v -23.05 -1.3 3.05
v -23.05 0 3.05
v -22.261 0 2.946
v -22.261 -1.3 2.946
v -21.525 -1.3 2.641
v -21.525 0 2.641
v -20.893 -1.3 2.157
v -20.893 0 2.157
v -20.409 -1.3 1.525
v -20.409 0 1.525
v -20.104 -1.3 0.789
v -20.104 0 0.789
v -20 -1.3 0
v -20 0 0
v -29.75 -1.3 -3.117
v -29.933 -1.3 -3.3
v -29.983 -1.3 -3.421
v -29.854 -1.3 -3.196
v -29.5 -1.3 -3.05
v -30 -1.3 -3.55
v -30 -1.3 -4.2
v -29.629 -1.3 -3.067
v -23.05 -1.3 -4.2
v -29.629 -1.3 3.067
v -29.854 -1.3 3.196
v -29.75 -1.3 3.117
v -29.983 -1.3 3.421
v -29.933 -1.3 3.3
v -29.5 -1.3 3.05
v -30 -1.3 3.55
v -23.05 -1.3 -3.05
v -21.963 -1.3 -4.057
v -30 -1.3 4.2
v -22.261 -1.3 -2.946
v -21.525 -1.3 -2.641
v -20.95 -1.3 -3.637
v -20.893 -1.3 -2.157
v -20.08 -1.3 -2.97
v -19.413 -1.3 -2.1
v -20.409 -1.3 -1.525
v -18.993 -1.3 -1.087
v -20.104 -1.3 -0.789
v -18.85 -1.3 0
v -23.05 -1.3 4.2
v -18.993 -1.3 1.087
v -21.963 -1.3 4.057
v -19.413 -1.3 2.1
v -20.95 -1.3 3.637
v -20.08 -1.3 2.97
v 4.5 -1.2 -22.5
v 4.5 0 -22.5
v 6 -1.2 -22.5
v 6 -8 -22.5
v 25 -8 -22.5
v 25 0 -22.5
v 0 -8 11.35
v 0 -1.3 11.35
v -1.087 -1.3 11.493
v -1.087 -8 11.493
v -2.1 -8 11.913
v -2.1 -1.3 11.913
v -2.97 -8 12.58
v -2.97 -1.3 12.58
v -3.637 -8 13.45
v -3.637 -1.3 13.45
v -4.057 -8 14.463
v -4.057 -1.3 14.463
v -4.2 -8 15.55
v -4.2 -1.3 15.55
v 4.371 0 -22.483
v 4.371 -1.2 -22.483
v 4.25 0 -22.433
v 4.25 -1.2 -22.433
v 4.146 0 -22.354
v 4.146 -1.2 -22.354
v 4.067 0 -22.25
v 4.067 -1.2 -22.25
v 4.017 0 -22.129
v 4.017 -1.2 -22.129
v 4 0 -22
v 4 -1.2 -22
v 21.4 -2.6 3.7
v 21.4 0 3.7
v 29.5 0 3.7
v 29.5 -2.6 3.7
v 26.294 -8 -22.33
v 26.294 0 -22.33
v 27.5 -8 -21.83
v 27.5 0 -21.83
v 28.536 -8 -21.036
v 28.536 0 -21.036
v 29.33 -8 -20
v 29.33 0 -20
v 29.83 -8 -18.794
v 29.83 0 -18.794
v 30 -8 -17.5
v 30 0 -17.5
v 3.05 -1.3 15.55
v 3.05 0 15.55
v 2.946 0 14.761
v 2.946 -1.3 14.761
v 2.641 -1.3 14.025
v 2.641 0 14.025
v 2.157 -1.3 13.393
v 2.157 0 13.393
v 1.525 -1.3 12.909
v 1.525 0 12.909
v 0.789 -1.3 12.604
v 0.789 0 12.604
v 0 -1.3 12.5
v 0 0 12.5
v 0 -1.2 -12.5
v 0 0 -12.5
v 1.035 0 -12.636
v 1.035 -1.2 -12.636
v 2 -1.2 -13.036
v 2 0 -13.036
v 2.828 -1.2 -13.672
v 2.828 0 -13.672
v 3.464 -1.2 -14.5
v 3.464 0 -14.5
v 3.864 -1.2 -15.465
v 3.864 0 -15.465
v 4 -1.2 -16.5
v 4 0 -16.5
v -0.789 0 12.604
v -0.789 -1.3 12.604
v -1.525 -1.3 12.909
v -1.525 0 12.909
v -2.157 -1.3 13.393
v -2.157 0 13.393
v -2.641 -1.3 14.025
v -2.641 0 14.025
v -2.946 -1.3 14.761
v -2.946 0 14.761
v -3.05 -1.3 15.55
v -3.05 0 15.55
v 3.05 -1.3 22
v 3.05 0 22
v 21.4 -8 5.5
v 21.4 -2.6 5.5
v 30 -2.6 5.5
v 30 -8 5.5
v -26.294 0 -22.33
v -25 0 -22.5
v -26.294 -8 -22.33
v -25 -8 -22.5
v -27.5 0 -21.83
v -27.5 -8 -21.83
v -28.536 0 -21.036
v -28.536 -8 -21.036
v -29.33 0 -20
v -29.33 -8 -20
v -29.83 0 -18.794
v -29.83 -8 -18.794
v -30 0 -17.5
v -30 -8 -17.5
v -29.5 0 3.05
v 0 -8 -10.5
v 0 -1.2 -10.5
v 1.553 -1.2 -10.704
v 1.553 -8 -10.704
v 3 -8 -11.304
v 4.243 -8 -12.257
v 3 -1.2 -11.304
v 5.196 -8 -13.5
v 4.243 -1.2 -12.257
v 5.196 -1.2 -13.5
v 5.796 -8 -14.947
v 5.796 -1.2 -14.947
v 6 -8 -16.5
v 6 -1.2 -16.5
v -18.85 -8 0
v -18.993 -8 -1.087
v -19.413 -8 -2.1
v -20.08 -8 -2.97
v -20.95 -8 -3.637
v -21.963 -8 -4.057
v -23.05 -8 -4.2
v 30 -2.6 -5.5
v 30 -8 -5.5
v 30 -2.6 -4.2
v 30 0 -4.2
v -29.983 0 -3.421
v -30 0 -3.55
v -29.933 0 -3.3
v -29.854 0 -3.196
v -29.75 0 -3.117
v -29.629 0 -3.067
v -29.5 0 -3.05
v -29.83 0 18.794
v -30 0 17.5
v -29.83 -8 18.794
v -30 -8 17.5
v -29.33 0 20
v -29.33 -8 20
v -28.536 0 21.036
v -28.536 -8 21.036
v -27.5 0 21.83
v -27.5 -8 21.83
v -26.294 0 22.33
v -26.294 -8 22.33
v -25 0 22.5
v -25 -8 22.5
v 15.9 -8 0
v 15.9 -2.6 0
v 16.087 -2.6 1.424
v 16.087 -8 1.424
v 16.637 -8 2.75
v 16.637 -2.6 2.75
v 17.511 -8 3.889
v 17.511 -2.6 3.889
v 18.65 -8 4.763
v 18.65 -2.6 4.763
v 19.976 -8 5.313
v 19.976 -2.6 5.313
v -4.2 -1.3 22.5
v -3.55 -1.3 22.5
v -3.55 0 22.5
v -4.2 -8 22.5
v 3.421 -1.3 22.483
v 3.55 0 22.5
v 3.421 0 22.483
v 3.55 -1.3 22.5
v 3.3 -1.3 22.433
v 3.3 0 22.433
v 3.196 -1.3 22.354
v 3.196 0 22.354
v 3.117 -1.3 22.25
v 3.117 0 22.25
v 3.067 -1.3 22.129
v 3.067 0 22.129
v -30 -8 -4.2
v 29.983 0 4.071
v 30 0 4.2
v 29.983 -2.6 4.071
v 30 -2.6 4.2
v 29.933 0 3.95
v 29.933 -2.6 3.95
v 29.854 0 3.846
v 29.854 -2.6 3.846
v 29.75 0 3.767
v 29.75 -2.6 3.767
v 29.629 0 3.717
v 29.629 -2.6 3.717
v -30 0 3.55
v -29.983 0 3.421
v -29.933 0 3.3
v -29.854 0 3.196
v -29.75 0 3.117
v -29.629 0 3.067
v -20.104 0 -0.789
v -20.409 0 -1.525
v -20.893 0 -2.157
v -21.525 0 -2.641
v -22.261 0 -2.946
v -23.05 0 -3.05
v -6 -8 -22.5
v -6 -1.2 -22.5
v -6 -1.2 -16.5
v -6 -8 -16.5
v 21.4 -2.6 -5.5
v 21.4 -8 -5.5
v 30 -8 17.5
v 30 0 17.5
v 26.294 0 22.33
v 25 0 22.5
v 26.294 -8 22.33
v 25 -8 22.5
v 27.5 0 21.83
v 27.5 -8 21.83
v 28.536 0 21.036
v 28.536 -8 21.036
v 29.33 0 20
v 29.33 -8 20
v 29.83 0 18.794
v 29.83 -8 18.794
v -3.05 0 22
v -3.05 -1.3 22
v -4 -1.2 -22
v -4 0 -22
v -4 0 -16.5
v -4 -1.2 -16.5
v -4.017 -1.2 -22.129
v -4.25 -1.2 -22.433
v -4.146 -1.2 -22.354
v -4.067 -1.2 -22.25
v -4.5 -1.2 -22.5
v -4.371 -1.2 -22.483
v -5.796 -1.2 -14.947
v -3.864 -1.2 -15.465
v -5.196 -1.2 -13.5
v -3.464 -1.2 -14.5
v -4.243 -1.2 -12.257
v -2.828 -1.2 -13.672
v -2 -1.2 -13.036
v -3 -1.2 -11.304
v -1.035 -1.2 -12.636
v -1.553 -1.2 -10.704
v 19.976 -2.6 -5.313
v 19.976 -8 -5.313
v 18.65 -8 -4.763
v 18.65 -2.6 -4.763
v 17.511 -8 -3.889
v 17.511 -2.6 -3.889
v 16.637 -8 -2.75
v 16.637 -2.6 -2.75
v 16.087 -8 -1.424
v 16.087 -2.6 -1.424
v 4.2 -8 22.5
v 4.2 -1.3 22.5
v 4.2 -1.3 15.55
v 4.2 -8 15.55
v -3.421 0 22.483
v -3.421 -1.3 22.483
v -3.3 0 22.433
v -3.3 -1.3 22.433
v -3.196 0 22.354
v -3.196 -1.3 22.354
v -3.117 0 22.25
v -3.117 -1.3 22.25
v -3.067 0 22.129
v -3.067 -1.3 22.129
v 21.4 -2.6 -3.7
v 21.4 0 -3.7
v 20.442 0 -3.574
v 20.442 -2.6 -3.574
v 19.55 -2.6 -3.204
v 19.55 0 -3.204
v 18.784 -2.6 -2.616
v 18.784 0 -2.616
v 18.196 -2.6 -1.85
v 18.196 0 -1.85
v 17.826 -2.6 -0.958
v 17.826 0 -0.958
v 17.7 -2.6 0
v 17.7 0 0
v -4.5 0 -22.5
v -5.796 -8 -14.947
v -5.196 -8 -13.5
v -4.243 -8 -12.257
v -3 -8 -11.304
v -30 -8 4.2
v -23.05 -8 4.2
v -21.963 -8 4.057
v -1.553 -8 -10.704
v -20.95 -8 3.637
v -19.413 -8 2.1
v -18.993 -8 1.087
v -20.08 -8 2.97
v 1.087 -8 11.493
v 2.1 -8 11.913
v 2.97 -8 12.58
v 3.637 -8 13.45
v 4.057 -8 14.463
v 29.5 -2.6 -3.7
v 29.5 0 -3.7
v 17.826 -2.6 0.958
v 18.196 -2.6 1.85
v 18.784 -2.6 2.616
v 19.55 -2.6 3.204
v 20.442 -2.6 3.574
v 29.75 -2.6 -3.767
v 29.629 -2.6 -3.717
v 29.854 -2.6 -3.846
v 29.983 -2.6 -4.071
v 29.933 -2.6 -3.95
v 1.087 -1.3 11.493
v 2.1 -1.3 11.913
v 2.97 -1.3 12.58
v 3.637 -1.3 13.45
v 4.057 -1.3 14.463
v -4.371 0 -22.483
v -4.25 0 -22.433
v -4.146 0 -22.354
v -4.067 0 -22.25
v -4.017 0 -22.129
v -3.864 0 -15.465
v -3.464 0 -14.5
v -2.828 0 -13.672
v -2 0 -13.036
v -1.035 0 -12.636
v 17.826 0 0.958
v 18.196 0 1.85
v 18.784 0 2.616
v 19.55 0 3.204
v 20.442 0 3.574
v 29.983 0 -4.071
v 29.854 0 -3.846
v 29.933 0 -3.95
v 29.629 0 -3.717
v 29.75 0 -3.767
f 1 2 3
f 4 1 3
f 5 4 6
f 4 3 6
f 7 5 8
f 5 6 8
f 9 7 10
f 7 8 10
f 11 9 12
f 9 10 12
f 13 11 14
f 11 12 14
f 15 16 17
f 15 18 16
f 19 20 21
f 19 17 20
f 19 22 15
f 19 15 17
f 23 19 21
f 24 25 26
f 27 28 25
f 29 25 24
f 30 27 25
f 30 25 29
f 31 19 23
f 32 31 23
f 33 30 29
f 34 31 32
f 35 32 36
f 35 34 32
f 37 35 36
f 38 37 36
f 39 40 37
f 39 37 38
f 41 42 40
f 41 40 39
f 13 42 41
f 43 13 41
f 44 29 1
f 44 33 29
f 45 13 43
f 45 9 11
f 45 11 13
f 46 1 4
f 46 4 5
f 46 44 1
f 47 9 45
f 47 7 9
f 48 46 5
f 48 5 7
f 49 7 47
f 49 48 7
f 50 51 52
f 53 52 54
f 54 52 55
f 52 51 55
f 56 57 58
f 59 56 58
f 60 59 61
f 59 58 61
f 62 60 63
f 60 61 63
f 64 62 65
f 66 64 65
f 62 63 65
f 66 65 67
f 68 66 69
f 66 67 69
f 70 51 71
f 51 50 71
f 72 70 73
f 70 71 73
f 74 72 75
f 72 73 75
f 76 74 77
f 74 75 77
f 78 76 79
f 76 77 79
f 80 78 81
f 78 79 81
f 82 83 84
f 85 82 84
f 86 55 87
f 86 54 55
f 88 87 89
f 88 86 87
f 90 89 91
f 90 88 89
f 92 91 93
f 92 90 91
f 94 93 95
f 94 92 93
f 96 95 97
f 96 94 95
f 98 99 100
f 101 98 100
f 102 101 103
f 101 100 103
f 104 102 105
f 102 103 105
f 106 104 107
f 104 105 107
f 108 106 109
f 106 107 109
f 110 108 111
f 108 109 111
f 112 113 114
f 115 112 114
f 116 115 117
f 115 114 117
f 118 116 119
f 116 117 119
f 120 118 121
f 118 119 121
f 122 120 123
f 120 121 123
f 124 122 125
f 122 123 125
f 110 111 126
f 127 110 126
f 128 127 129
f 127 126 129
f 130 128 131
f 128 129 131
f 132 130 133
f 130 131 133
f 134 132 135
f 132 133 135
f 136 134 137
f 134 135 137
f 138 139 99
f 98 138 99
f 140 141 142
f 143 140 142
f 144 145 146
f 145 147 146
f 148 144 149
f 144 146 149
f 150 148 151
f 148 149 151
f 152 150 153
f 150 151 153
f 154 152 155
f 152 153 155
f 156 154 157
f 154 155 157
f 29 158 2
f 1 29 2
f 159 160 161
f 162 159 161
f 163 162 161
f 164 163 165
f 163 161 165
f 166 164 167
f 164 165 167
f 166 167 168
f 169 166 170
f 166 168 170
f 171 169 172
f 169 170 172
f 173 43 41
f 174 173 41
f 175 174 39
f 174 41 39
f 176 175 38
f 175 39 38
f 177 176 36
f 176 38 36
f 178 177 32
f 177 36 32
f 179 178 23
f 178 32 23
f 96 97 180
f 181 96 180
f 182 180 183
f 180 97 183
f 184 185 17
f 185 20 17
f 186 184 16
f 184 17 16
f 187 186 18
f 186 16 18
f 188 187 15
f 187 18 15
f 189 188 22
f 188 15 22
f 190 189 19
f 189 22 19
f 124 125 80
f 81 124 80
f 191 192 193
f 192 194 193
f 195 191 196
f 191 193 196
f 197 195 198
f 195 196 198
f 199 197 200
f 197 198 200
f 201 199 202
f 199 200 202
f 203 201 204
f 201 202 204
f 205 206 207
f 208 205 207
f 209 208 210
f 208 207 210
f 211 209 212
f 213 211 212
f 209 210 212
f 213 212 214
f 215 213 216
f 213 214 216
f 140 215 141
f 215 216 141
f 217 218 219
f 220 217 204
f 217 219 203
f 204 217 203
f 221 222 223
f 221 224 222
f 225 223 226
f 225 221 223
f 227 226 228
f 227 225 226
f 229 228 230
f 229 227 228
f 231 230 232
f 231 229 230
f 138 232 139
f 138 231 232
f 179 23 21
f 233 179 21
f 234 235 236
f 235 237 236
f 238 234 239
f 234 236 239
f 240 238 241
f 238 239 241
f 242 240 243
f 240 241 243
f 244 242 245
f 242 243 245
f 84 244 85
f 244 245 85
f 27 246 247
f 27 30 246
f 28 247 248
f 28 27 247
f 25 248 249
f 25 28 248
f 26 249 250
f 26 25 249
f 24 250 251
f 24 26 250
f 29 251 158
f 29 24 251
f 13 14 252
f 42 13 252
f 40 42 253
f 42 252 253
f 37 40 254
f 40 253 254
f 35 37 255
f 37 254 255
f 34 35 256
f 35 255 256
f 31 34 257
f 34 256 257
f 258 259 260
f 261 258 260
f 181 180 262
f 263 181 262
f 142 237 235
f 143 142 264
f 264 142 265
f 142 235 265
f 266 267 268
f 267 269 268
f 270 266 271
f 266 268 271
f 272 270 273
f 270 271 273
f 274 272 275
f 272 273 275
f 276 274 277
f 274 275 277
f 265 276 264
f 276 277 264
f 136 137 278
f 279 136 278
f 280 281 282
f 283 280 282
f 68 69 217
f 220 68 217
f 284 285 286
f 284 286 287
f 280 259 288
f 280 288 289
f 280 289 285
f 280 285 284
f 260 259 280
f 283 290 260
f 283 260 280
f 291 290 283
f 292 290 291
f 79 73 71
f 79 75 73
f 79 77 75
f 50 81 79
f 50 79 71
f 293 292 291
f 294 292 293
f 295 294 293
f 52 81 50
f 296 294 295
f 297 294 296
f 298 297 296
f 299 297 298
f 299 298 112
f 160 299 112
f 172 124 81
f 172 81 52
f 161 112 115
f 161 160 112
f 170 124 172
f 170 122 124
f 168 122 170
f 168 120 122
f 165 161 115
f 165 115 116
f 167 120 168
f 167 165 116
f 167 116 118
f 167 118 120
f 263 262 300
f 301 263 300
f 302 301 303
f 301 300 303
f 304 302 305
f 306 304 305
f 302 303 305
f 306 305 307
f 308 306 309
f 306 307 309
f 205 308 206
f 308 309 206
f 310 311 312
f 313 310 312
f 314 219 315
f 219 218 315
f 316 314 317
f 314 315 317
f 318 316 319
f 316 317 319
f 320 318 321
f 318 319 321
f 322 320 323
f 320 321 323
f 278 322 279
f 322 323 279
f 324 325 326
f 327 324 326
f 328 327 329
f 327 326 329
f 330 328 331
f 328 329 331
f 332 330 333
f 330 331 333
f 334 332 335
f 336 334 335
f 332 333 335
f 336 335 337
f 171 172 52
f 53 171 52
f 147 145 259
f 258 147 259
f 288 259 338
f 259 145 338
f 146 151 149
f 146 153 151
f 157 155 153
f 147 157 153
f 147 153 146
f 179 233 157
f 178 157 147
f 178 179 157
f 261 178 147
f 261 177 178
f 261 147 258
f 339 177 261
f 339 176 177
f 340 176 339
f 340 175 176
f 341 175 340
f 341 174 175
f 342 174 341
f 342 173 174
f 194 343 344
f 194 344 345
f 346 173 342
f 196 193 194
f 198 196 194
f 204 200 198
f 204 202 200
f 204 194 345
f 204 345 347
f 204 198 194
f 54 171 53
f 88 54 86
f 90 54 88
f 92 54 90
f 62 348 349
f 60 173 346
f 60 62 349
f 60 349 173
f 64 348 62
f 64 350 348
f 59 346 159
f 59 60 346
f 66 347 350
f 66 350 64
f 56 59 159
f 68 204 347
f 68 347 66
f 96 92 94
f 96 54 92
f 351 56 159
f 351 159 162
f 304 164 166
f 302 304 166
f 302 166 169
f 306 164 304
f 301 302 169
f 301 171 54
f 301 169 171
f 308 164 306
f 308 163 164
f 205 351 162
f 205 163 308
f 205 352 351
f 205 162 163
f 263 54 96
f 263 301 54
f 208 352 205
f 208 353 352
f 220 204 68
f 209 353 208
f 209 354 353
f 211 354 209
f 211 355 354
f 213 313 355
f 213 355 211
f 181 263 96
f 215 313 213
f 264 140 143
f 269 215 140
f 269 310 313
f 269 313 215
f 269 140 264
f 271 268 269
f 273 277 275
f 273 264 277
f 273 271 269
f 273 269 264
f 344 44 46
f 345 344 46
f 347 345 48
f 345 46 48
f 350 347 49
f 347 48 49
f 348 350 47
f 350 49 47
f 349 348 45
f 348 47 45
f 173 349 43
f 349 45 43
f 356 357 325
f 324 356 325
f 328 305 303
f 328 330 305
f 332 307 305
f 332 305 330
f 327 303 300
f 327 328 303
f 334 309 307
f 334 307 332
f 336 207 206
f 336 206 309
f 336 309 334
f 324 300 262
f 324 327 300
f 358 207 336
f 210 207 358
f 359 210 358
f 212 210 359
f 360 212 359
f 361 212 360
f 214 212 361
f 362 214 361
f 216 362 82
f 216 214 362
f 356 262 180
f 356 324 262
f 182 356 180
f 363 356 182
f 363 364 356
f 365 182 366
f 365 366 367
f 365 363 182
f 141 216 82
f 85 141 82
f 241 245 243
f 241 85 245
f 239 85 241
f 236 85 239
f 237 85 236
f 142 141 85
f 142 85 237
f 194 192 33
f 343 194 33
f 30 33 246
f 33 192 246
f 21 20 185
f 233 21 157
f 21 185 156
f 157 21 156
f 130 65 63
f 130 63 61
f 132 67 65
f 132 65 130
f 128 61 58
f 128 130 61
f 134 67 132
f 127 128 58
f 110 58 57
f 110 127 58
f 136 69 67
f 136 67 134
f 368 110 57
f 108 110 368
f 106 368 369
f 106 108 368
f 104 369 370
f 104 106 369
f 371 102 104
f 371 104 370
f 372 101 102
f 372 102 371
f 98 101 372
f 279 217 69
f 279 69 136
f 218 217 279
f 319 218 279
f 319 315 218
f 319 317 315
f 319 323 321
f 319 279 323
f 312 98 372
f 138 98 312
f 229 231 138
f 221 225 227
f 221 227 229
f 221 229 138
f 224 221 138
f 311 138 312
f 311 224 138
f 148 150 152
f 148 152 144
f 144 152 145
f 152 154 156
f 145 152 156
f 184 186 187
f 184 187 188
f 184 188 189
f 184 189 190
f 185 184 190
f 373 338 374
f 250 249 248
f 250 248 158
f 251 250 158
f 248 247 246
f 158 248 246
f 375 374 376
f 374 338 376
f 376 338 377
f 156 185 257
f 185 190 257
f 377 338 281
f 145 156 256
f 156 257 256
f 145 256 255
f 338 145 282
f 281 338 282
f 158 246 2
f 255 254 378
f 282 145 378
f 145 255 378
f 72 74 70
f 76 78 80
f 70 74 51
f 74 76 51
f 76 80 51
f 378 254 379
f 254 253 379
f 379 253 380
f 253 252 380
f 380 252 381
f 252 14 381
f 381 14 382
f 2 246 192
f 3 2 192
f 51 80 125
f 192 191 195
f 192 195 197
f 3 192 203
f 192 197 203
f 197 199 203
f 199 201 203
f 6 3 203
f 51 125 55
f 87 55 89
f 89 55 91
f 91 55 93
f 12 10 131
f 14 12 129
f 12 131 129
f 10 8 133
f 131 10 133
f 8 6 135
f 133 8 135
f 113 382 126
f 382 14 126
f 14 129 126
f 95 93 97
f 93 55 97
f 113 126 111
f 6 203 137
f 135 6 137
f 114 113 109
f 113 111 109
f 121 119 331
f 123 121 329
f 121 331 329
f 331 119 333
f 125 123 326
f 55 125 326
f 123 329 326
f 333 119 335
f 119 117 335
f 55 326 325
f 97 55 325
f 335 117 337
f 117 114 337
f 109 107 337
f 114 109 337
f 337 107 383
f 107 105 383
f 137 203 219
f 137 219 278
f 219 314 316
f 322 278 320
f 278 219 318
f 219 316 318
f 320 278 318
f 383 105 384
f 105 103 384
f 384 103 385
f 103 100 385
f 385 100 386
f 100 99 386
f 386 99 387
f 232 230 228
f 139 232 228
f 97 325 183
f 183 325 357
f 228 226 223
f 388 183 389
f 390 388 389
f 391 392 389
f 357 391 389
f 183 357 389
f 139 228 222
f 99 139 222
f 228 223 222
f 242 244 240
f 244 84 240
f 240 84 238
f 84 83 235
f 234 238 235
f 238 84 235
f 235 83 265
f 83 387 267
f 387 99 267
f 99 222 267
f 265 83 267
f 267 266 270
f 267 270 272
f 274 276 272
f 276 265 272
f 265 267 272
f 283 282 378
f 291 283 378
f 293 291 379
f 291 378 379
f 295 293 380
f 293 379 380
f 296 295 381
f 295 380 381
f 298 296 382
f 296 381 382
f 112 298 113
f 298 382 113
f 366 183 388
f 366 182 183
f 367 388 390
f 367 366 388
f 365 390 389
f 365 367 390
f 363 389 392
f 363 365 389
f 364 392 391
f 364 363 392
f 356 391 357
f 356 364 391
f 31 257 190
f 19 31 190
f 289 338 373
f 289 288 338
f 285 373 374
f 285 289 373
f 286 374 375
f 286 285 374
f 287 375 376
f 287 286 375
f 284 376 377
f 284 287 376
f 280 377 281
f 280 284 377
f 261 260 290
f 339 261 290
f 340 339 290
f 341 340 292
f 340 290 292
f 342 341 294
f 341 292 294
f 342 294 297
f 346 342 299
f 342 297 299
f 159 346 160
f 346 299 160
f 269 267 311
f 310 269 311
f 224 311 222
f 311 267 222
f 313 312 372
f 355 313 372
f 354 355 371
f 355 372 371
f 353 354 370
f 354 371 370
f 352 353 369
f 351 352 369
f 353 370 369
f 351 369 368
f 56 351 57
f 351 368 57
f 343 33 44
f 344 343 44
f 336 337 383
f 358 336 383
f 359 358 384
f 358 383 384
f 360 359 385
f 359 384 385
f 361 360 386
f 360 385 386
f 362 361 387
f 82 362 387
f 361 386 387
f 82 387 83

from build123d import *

# Parameters (mm, degrees)
F1_DEPTH = 8
F2_DEPTH = 1.3
F3_DEPTH = 2.6
F4_DEPTH = 1.3
F5_DEPTH = 1.2
F6_R     = 5
F7_R     = 0.5


with BuildPart() as f1:
    # F0 (on Front) → F1 (new body)
    with BuildSketch(Plane.XZ):
        with BuildLine():
            Line((6, -22.5), (30, -22.5))
            Line((30, -22.5), (30, -5.5))
            Line((30, -5.5), (21.4, -5.5))
            ThreePointArc((21.4, -5.5), (17.5109127035, -3.8890872965), (15.9, 0))
            ThreePointArc((15.9, 0), (17.5109127035, 3.8890872965), (21.4, 5.5))
            Line((21.4, 5.5), (30, 5.5))
            Line((30, 5.5), (30, 22.5))
            Line((30, 22.5), (4.2, 22.5))
            Line((4.2, 22.5), (4.2, 15.5500004172))
            ThreePointArc((4.2, 15.5500004172), (2.969848481, 12.5801519362), (0, 11.3500004172))
            ThreePointArc((0, 11.3500004172), (-2.969848481, 12.5801519362), (-4.2, 15.5500004172))
            Line((-4.2, 15.5500004172), (-4.2, 22.5))
            Line((-4.2, 22.5), (-30, 22.5))
            Line((-30, 22.5), (-30, 4.2))
            Line((-30, 4.2), (-23.05, 4.2))
            ThreePointArc((-23.05, 4.2), (-20.080151519, 2.969848481), (-18.85, 0))
            ThreePointArc((-18.85, 0), (-20.080151519, -2.969848481), (-23.05, -4.2))
            Line((-23.05, -4.2), (-30, -4.2))
            Line((-30, -4.2), (-30, -22.5))
            Line((-30, -22.5), (-6, -22.5))
            Line((-6, -22.5), (-6, -16.5))
            ThreePointArc((-6, -16.5), (-4.2426406871, -12.2573593129), (0, -10.5))
            ThreePointArc((0, -10.5), (4.2426406871, -12.2573593129), (6, -16.5))
            Line((6, -16.5), (6, -22.5))
        make_face()
    extrude(amount=F1_DEPTH)

    # F0 (on Front) → F2 (join)
    with BuildSketch(Plane.XZ):
        with BuildLine():
            Line((-30, -3.05), (-30, -4.2))
            Line((-30, -4.2), (-23.05, -4.2))
            ThreePointArc((-23.05, -4.2), (-20.080151519, -2.969848481), (-18.85, 0))
            ThreePointArc((-18.85, 0), (-20.080151519, 2.969848481), (-23.05, 4.2))
            Line((-23.05, 4.2), (-30, 4.2))
            Line((-30, 4.2), (-30, 3.05))
            Line((-30, 3.05), (-23.05, 3.05))
            ThreePointArc((-23.05, 3.05), (-20.8933243174, 2.1566756826), (-20, 0))
            ThreePointArc((-20, 0), (-20.8933243174, -2.1566756826), (-23.05, -3.05))
            Line((-23.05, -3.05), (-30, -3.05))
        make_face()
    extrude(amount=F2_DEPTH)

    # F0 (on Front) → F3 (join)
    with BuildSketch(Plane.XZ):
        with BuildLine():
            Line((21.4, -5.5), (30, -5.5))
            Line((30, -5.5), (30, -3.7))
            Line((30, -3.7), (21.4, -3.7))
            ThreePointArc((21.4, -3.7), (18.7837049096, -2.6162950904), (17.7, 0))
            ThreePointArc((17.7, 0), (18.7837049096, 2.6162950904), (21.4, 3.7))
            Line((21.4, 3.7), (30, 3.7))
            Line((30, 3.7), (30, 5.5))
            Line((30, 5.5), (21.4, 5.5))
            ThreePointArc((21.4, 5.5), (17.5109127035, 3.8890872965), (15.9, 0))
            ThreePointArc((15.9, 0), (17.5109127035, -3.8890872965), (21.4, -5.5))
        make_face()
    extrude(amount=F3_DEPTH)

    # F0 (on Front) → F4 (join)
    with BuildSketch(Plane.XZ):
        with BuildLine():
            Line((4.2, 15.5500004172), (4.2, 22.5))
            Line((4.2, 22.5), (3.05, 22.5))
            Line((3.05, 22.5), (3.05, 15.5500004172))
            ThreePointArc((3.05, 15.5500004172), (2.1566756826, 13.3933247346), (0, 12.5000004172))
            ThreePointArc((0, 12.5000004172), (-2.1566756826, 13.3933247346), (-3.05, 15.5500004172))
            Line((-3.05, 15.5500004172), (-3.05, 22.5))
            Line((-3.05, 22.5), (-4.2, 22.5))
            Line((-4.2, 22.5), (-4.2, 15.5500004172))
            ThreePointArc((-4.2, 15.5500004172), (-2.969848481, 12.5801519362), (0, 11.3500004172))
            ThreePointArc((0, 11.3500004172), (2.969848481, 12.5801519362), (4.2, 15.5500004172))
        make_face()
    extrude(amount=F4_DEPTH)

    # F0 (on Front) → F5 (join)
    with BuildSketch(Plane.XZ):
        with BuildLine():
            Line((4, -22.5), (6, -22.5))
            Line((6, -22.5), (6, -16.5))
            ThreePointArc((6, -16.5), (4.2426406871, -12.2573593129), (0, -10.5))
            ThreePointArc((0, -10.5), (-4.2426406871, -12.2573593129), (-6, -16.5))
            Line((-6, -16.5), (-6, -22.5))
            Line((-6, -22.5), (-4, -22.5))
            Line((-4, -22.5), (-4, -16.5))
            ThreePointArc((-4, -16.5), (-2.8284271247, -13.6715728753), (0, -12.5))
            ThreePointArc((0, -12.5), (2.8284271247, -13.6715728753), (4, -16.5))
            Line((4, -16.5), (4, -22.5))
        make_face()
    extrude(amount=F5_DEPTH)

    # F6
    f6_edges = [f1.edges().sort_by_distance(p)[0] for p in [
        (-30, -4, 22.5),
        (30, -4, 22.5),
        (-30, -4, -22.5),
        (30, -4, -22.5),
    ]]
    fillet(f6_edges, radius=F6_R)

    # F7
    f7_edges = [f1.edges().sort_by_distance(p)[0] for p in [
        (-30, -0.65, 3.05),
        (-30, -0.65, -3.05),
        (30, -1.3, 3.7),
        (30, -1.3, -3.7),
        (4, -0.6, -22.5),
        (-4, -0.6, -22.5),
        (3.05, -0.65, 22.5),
        (-3.05, -0.65, 22.5),
    ]]
    fillet(f7_edges, radius=F7_R)


solid = f1.part
